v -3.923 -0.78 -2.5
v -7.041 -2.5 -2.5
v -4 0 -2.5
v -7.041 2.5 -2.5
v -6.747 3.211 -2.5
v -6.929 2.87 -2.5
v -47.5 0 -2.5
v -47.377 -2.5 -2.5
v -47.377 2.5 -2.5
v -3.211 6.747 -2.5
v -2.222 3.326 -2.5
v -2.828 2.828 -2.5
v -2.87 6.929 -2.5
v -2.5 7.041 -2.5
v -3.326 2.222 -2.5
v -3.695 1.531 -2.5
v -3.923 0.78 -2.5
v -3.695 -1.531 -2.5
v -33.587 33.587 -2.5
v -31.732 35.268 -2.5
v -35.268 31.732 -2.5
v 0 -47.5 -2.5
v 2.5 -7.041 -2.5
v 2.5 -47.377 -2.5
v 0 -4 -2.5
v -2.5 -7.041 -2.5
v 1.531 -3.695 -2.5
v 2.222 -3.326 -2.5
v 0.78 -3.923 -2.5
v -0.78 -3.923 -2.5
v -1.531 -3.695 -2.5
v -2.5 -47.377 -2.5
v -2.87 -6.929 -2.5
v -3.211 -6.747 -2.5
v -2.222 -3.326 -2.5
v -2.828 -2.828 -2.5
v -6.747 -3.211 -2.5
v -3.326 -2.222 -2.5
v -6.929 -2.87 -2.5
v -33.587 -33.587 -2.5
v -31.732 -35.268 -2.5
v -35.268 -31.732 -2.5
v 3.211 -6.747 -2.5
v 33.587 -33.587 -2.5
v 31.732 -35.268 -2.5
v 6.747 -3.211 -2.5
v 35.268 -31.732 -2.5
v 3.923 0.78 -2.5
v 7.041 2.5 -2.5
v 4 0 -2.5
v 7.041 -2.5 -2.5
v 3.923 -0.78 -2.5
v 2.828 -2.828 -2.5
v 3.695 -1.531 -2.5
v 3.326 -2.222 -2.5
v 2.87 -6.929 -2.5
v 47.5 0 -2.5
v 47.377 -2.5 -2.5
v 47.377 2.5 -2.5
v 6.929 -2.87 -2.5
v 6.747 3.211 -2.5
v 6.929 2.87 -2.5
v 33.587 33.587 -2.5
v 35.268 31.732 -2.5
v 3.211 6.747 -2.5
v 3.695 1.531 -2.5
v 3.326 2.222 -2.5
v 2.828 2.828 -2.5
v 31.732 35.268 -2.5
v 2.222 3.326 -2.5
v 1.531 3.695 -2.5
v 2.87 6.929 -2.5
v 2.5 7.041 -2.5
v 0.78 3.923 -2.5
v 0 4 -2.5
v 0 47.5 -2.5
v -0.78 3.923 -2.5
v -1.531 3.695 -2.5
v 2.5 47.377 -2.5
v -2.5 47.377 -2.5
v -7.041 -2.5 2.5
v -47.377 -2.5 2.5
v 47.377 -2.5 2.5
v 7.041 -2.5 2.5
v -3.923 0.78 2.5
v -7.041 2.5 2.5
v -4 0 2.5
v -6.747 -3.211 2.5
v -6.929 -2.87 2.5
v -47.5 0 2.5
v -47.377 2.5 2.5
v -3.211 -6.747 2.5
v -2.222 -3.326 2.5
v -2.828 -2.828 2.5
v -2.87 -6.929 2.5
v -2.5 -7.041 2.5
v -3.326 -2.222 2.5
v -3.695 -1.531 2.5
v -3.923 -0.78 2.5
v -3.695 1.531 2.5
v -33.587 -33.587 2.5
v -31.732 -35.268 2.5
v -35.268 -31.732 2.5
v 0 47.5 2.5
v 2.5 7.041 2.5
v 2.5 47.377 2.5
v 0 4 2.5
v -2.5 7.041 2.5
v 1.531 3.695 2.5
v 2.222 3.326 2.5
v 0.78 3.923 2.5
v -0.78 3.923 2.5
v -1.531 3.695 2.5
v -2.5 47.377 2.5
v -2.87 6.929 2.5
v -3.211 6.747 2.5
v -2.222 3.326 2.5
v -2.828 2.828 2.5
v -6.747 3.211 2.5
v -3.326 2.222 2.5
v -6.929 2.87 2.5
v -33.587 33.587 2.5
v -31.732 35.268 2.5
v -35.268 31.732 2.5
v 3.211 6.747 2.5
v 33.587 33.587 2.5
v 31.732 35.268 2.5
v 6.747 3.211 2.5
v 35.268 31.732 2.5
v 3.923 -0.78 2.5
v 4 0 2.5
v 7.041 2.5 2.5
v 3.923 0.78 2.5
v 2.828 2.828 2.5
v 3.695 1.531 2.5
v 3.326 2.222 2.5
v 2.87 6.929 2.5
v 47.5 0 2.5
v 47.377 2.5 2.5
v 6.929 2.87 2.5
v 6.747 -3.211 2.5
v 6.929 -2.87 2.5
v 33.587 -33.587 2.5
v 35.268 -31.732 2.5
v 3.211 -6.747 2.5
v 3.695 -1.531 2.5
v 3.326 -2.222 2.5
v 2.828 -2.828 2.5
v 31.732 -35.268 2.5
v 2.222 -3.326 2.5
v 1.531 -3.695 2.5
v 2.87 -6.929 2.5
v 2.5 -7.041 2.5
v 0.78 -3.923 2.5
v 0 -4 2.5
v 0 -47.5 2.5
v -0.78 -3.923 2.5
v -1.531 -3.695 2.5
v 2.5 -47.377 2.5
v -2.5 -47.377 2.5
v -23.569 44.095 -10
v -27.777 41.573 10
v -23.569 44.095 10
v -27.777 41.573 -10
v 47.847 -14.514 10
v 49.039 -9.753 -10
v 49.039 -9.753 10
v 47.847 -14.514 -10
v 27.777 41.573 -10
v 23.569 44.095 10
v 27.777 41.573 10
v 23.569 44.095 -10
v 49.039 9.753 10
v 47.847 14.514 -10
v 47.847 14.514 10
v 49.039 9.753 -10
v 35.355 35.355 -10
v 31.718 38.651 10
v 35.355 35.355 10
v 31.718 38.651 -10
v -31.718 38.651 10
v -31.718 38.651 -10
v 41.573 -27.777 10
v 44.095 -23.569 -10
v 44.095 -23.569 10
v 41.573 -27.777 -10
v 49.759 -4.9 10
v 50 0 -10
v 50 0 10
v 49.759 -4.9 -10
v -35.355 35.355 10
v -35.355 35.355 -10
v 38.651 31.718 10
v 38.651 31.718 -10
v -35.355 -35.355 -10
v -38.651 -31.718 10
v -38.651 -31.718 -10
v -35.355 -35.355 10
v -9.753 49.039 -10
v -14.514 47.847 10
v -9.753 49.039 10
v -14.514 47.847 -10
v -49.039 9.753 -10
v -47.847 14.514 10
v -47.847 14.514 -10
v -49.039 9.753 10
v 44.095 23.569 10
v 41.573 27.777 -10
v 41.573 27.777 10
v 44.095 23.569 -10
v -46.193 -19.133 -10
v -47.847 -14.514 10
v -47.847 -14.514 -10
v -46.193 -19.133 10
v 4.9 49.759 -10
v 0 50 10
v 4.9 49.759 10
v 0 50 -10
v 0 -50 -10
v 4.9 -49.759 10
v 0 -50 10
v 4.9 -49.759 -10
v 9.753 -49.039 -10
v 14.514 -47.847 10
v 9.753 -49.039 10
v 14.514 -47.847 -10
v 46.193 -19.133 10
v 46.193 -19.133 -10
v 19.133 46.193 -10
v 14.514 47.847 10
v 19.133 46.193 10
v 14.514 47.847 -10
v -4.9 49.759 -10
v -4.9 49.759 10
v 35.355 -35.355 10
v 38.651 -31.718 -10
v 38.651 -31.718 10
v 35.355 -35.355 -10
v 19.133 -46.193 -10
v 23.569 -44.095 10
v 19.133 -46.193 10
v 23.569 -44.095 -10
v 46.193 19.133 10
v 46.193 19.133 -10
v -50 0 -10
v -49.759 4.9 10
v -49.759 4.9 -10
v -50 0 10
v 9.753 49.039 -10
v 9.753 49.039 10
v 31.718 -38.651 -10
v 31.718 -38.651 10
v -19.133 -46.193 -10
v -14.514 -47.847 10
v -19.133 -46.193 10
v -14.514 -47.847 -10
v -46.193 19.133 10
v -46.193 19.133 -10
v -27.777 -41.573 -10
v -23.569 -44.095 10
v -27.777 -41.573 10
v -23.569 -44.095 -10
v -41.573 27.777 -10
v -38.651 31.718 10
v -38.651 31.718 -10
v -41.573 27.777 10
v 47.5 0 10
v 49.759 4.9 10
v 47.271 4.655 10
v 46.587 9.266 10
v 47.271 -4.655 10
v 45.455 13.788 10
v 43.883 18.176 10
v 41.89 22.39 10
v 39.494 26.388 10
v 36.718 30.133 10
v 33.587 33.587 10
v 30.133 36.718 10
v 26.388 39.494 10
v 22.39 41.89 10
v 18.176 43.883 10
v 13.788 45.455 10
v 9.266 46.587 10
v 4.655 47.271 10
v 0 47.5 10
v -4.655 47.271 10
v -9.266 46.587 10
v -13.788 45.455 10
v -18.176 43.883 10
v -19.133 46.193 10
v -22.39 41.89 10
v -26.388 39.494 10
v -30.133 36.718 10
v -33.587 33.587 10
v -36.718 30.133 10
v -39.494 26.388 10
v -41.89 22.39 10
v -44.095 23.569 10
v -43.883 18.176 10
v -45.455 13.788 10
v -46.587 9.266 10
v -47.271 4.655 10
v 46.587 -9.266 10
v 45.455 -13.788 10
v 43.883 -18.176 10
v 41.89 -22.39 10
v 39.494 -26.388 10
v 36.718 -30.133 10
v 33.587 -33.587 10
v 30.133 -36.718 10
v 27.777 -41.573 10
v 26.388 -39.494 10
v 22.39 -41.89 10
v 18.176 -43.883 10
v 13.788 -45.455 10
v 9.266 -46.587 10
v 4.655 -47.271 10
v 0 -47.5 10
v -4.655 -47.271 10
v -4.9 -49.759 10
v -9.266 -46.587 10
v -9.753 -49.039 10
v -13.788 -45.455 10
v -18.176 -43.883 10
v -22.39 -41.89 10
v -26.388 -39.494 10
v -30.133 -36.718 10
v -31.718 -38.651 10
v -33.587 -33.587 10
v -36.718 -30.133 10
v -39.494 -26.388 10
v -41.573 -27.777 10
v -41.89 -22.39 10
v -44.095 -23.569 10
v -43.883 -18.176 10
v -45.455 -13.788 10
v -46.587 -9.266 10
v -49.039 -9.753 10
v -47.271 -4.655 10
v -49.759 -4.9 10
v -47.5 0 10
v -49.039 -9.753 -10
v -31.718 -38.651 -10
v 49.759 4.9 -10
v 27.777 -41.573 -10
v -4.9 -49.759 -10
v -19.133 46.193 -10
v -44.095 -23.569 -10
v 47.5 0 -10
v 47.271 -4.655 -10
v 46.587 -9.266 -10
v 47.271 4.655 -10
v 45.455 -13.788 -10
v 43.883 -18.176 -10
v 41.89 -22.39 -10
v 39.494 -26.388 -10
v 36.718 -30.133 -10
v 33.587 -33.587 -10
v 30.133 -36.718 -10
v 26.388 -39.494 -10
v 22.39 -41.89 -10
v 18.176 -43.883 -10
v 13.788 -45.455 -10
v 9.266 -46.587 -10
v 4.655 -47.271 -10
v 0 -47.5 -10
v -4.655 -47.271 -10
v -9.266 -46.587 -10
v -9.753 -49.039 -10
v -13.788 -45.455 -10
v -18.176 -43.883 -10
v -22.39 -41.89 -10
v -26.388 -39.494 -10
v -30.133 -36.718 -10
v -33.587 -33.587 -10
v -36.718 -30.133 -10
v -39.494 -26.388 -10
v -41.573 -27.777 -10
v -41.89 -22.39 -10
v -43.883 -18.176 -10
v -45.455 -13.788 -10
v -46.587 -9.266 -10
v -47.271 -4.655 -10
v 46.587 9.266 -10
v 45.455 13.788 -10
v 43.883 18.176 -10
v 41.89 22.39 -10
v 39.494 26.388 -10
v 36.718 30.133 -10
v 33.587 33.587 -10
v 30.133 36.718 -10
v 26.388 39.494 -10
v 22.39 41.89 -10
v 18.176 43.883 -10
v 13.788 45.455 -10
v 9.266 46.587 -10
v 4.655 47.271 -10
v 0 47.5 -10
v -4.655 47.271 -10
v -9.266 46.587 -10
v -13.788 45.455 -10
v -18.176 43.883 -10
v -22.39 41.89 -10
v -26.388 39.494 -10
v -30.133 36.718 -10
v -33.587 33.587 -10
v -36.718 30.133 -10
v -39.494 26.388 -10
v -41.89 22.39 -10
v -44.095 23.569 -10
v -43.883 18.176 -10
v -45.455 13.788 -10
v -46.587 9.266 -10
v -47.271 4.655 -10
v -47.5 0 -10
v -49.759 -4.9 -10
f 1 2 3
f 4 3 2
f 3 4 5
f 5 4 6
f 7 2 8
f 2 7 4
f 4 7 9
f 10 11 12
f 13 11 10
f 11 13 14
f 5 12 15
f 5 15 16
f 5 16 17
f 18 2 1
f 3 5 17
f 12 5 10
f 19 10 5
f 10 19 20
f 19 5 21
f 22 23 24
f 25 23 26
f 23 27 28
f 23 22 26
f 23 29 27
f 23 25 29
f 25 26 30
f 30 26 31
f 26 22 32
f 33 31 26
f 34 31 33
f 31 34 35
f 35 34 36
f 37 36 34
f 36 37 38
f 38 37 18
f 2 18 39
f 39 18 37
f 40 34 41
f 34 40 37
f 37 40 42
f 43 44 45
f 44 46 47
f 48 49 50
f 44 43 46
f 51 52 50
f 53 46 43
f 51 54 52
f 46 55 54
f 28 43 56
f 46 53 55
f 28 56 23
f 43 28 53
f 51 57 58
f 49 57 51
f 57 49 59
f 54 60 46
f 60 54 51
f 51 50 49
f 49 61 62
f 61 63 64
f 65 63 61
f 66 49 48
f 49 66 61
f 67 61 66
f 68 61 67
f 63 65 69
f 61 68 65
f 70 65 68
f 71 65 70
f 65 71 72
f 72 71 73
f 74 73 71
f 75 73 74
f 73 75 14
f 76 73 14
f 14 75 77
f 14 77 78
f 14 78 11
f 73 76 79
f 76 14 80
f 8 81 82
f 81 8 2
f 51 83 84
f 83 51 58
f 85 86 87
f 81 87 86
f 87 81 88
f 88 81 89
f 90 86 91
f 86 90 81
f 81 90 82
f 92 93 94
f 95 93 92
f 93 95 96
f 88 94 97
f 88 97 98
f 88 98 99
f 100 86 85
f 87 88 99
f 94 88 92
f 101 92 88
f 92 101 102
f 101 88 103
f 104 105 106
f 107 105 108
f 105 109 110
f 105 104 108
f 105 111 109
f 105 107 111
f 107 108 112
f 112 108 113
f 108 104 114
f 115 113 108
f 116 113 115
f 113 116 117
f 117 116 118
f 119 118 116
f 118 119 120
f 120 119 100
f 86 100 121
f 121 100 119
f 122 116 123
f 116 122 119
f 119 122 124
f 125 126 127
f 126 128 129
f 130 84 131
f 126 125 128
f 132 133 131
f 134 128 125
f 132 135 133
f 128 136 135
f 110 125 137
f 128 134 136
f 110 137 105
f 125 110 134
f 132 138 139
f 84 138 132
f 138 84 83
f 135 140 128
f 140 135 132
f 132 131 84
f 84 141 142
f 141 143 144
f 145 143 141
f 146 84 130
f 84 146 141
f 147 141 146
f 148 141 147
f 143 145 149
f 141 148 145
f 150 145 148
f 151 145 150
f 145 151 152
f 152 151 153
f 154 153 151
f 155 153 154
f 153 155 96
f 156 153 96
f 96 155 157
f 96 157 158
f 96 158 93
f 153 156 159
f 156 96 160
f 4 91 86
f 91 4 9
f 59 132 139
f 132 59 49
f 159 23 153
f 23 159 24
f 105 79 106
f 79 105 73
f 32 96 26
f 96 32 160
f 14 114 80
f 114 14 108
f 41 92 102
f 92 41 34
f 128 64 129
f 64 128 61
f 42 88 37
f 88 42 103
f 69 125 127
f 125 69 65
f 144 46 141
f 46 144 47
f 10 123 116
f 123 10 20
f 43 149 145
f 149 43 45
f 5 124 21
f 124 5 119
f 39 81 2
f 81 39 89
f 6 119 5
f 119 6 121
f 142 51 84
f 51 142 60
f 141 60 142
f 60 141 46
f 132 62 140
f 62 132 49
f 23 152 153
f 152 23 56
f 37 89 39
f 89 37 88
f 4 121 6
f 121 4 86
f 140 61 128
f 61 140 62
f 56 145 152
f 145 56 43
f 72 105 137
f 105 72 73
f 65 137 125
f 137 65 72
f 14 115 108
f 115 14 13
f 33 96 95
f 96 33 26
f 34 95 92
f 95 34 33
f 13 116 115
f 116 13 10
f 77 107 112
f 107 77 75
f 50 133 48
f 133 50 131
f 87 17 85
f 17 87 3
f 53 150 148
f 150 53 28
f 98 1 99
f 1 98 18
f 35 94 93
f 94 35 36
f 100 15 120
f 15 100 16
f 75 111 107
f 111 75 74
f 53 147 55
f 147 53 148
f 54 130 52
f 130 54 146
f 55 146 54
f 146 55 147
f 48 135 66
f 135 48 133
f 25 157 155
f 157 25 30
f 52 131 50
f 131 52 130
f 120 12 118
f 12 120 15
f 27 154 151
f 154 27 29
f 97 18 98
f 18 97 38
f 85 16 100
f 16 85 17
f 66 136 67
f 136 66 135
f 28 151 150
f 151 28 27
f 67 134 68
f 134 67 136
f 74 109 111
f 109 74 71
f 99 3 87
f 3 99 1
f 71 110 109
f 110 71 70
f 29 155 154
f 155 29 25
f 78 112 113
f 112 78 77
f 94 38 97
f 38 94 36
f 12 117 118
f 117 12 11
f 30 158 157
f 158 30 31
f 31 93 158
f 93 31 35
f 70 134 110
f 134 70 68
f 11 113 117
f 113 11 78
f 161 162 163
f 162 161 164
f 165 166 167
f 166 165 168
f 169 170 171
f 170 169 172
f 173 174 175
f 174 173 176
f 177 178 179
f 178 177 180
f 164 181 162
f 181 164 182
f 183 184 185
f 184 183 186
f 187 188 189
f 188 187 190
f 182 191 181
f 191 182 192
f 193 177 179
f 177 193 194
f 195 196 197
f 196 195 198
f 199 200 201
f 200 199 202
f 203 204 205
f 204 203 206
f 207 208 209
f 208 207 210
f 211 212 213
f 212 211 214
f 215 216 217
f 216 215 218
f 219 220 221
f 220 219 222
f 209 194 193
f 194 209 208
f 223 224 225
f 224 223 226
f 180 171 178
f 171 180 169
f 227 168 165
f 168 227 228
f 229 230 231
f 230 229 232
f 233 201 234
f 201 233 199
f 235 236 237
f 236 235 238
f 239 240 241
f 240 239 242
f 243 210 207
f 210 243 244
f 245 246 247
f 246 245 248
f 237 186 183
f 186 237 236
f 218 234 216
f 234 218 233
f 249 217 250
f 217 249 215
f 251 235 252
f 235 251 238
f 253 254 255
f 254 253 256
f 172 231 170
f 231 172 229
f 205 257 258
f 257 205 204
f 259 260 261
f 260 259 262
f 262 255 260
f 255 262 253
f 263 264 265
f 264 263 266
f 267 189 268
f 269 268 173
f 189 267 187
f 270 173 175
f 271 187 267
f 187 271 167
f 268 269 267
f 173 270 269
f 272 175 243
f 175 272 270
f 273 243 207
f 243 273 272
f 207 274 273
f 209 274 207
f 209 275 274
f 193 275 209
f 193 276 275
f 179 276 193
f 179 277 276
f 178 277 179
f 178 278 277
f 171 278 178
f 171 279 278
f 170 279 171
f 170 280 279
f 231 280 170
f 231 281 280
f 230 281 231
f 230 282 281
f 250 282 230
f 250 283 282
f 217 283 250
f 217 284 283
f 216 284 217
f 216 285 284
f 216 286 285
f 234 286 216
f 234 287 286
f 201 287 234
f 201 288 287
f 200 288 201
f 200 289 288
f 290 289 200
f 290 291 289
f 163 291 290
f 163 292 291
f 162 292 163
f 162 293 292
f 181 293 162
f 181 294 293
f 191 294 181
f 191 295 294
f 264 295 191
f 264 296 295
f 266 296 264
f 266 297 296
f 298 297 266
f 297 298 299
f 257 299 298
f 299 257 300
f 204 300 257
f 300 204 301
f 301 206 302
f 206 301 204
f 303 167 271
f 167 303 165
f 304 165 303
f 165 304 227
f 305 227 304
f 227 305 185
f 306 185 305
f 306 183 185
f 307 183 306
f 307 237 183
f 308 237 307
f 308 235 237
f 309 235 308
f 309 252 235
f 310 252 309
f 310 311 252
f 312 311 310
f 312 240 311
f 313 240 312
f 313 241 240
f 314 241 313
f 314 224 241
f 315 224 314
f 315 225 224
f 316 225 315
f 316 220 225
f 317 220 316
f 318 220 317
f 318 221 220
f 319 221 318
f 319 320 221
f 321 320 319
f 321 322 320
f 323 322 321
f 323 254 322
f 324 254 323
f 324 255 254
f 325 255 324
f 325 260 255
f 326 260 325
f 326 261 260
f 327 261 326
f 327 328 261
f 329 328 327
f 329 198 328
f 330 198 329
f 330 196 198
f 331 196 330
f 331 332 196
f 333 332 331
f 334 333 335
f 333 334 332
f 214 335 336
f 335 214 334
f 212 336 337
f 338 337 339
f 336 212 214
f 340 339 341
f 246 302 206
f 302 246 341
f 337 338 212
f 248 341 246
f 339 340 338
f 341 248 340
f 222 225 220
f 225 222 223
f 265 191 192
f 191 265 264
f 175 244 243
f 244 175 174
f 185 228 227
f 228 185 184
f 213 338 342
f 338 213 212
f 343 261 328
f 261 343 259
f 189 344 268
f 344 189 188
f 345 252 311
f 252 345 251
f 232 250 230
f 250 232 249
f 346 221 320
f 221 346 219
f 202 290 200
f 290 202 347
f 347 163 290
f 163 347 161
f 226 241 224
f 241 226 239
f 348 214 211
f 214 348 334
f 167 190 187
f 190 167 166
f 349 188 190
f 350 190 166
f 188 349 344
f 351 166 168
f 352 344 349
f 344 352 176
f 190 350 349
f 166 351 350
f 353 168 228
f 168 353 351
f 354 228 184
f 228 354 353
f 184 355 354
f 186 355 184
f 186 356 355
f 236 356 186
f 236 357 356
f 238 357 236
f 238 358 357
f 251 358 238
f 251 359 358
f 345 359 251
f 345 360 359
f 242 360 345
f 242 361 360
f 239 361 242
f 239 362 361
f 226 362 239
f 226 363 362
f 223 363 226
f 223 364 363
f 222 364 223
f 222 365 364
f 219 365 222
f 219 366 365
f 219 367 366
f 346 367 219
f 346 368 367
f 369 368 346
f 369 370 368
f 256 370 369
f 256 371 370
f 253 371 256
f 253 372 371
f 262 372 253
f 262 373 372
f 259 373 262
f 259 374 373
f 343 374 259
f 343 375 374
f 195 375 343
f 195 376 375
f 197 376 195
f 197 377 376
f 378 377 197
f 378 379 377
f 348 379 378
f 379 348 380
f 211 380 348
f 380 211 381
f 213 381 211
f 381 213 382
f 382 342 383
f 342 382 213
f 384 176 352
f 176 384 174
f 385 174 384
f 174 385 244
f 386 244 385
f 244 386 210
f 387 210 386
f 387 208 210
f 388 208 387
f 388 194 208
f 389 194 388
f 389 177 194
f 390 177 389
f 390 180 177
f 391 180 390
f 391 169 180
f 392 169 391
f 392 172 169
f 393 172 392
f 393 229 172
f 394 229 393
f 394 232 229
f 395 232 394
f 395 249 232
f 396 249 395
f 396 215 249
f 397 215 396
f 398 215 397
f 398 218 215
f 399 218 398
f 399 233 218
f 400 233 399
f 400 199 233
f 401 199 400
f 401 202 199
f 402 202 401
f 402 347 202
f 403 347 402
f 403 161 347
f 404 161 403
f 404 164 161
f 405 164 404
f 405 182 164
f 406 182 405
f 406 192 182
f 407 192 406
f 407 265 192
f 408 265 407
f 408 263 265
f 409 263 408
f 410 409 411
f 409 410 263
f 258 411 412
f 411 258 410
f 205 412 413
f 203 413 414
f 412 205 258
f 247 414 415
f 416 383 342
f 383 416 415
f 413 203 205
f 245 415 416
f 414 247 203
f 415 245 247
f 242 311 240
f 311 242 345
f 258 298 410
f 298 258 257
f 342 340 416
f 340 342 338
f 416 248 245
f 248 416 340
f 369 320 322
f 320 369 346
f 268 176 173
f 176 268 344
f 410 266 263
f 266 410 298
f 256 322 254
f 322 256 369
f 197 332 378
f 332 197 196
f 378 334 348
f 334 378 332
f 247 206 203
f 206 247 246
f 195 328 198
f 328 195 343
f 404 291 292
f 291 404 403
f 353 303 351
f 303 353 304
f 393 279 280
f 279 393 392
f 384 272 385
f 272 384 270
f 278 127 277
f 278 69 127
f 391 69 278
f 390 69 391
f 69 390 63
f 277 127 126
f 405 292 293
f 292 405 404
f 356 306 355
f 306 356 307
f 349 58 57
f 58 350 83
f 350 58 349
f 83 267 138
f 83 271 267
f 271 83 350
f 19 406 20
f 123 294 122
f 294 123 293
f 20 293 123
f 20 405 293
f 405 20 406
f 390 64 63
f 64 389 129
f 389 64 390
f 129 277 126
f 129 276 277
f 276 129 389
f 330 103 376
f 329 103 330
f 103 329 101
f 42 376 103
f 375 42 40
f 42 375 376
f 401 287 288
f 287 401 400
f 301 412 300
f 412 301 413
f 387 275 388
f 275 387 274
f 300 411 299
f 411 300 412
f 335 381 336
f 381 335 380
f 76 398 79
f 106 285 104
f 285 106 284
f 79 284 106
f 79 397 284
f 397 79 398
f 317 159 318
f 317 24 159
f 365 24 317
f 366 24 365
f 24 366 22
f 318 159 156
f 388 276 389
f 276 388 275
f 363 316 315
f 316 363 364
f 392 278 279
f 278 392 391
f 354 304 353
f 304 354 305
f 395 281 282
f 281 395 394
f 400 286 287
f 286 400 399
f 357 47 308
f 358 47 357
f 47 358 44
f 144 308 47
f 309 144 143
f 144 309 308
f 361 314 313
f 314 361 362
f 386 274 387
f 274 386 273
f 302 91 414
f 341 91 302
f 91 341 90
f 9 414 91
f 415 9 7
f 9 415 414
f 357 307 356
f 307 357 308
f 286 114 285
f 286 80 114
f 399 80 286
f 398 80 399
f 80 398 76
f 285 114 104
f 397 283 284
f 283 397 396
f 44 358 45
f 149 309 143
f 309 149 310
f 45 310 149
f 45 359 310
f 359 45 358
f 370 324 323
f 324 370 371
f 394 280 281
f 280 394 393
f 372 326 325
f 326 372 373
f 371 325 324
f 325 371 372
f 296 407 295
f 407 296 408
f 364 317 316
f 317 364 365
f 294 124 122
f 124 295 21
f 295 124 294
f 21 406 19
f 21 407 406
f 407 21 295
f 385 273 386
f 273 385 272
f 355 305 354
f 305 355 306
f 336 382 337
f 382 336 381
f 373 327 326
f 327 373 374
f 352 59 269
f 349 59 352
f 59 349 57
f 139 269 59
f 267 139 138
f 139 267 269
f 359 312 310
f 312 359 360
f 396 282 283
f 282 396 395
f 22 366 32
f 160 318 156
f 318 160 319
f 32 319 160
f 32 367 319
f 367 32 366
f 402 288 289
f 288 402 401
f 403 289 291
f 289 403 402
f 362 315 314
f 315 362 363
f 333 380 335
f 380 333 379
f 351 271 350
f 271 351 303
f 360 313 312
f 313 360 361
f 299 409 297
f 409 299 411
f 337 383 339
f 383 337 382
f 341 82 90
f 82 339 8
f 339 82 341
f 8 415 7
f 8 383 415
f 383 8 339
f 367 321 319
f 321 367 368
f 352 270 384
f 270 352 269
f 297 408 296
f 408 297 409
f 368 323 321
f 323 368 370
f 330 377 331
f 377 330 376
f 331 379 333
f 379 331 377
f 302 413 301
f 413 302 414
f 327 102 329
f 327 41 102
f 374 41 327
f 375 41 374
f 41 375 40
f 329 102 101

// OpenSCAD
union()
{
    difference()
    {
        union()
        {
            union()
            {
                union()
                {
                    linear_extrude(height = 5.0, twist = 0.0, scale = 1.0, slices = 1, center = true)
                    {
                        scale([99.0, 5.0])
                        {
                            M52();
                        }
                    }
                    rotate([0.0, 0.0, 90.0])
                    {
                        linear_extrude(height = 5.0, twist = 0.0, scale = 1.0, slices = 1, center = true)
                        {
                            scale([99.0, 5.0])
                            {
                                M52();
                            }
                        }
                    }
                }
                rotate([0.0, 0.0, 45.0])
                {
                    union()
                    {
                        linear_extrude(height = 5.0, twist = 0.0, scale = 1.0, slices = 1, center = true)
                        {
                            scale([99.0, 5.0])
                            {
                                M52();
                            }
                        }
                        rotate([0.0, 0.0, 90.0])
                        {
                            linear_extrude(height = 5.0, twist = 0.0, scale = 1.0, slices = 1, center = true)
                            {
                                scale([99.0, 5.0])
                                {
                                    M52();
                                }
                            }
                        }
                    }
                }
            }
            difference()
            {
                linear_extrude(height = 5.0, twist = 0.0, scale = 1.0, slices = 1, center = true)
                {
                    scale([15.0, 15.0])
                    {
                        M51();
                    }
                }
                linear_extrude(height = 6.0, twist = 0.0, scale = 1.0, slices = 1, center = true)
                {
                    scale([8.0, 8.0])
                    {
                        M51();
                    }
                }
            }
        }
        linear_extrude(height = 6.0, twist = 0.0, scale = 1.0, slices = 1, center = true)
        {
            scale([8.0, 8.0])
            {
                M51();
            }
        }
    }
    difference()
    {
        linear_extrude(height = 20.0, twist = 0.0, scale = 1.0, slices = 1, center = true)
        {
            scale([100.0, 100.0])
            {
                M107();
            }
        }
        linear_extrude(height = 21.0, twist = 0.0, scale = 1.0, slices = 1, center = true)
        {
            scale([95.0, 95.0])
            {
                M107();
            }
        }
    }
}

module M51()
{
    polygon
    (
        points =
        [
            [0.5, 0.0], 
            [0.4903926402016152, 0.09754516100806412], 
            [0.46193976625564337, 0.1913417161825449], 
            [0.4157348061512726, 0.2777851165098011], 
            [0.3535533905932738, 0.35355339059327373], 
            [0.27778511650980114, 0.4157348061512726], 
            [0.19134171618254492, 0.46193976625564337], 
            [0.09754516100806417, 0.4903926402016152], 
            [3.061616997868383E-17, 0.5], 
            [-0.0975451610080641, 0.4903926402016152], 
            [-0.19134171618254486, 0.46193976625564337], 
            [-0.277785116509801, 0.41573480615127273], 
            [-0.35355339059327373, 0.3535533905932738], 
            [-0.4157348061512727, 0.2777851165098011], 
            [-0.46193976625564337, 0.19134171618254495], 
            [-0.4903926402016152, 0.0975451610080643], 
            [-0.5, 6.123233995736766E-17], 
            [-0.4903926402016152, -0.09754516100806418], 
            [-0.4619397662556434, -0.19134171618254484], 
            [-0.41573480615127273, -0.277785116509801], 
            [-0.35355339059327384, -0.35355339059327373], 
            [-0.2777851165098011, -0.4157348061512726], 
            [-0.19134171618254517, -0.46193976625564326], 
            [-0.09754516100806433, -0.49039264020161516], 
            [-9.184850993605148E-17, -0.5], 
            [0.09754516100806415, -0.4903926402016152], 
            [0.191341716182545, -0.4619397662556433], 
            [0.2777851165098009, -0.41573480615127273], 
            [0.3535533905932737, -0.35355339059327384], 
            [0.4157348061512726, -0.2777851165098011], 
            [0.46193976625564326, -0.1913417161825452], 
            [0.49039264020161516, -0.09754516100806436]
        ],
        paths =
        [
            [0, 1, 2, 3, 4, 5, 6, 7, 8, 9, 10, 11, 12, 13, 14, 15, 16, 17, 18, 19, 20, 21, 22, 23, 24, 25, 26, 27, 28, 29, 30, 31]
        ]
    );
}

module M52()
{
    polygon
    (
        points =
        [
            [-0.5, -0.5], 
            [0.5, -0.5], 
            [0.5, 0.5], 
            [-0.5, 0.5]
        ],
        paths =
        [
            [0, 1, 2, 3]
        ]
    );
}

module M107()
{
    polygon
    (
        points =
        [
            [0.5, 0.0], 
            [0.49759236333609846, 0.0490085701647803], 
            [0.4903926402016152, 0.09754516100806412], 
            [0.4784701678661044, 0.14514233862723117], 
            [0.46193976625564337, 0.1913417161825449], 
            [0.4409606321741775, 0.23569836841299882], 
            [0.4157348061512726, 0.2777851165098011], 
            [0.3865052266813685, 0.31719664208182274], 
            [0.3535533905932738, 0.35355339059327373], 
            [0.31719664208182274, 0.3865052266813685], 
            [0.27778511650980114, 0.4157348061512726], 
            [0.2356983684129989, 0.44096063217417747], 
            [0.19134171618254492, 0.46193976625564337], 
            [0.14514233862723117, 0.47847016786610447], 
            [0.09754516100806417, 0.4903926402016152], 
            [0.049008570164780385, 0.4975923633360984], 
            [3.061616997868383E-17, 0.5], 
            [-0.04900857016478032, 0.49759236333609846], 
            [-0.0975451610080641, 0.4903926402016152], 
            [-0.14514233862723108, 0.47847016786610447], 
            [-0.19134171618254486, 0.46193976625564337], 
            [-0.23569836841299885, 0.4409606321741775], 
            [-0.277785116509801, 0.41573480615127273], 
            [-0.3171966420818227, 0.38650522668136855], 
            [-0.35355339059327373, 0.3535533905932738], 
            [-0.3865052266813685, 0.31719664208182274], 
            [-0.4157348061512727, 0.2777851165098011], 
            [-0.44096063217417747, 0.23569836841299893], 
            [-0.46193976625564337, 0.19134171618254495], 
            [-0.4784701678661044, 0.1451423386272312], 
            [-0.4903926402016152, 0.0975451610080643], 
            [-0.4975923633360984, 0.04900857016478041], 
            [-0.5, 6.123233995736766E-17], 
            [-0.49759236333609846, -0.049008570164780295], 
            [-0.4903926402016152, -0.09754516100806418], 
            [-0.47847016786610447, -0.14514233862723105], 
            [-0.4619397662556434, -0.19134171618254484], 
            [-0.4409606321741775, -0.23569836841299882], 
            [-0.41573480615127273, -0.277785116509801], 
            [-0.38650522668136855, -0.31719664208182263], 
            [-0.35355339059327384, -0.35355339059327373], 
            [-0.31719664208182297, -0.38650522668136833], 
            [-0.2777851165098011, -0.4157348061512726], 
            [-0.23569836841299893, -0.44096063217417747], 
            [-0.19134171618254517, -0.46193976625564326], 
            [-0.14514233862723122, -0.4784701678661044], 
            [-0.09754516100806433, -0.49039264020161516], 
            [-0.049008570164780225, -0.49759236333609846], 
            [-9.184850993605148E-17, -0.5], 
            [0.049008570164780045, -0.49759236333609846], 
            [0.09754516100806415, -0.4903926402016152], 
            [0.14514233862723103, -0.47847016786610447], 
            [0.191341716182545, -0.4619397662556433], 
            [0.2356983684129988, -0.4409606321741775], 
            [0.2777851165098009, -0.41573480615127273], 
            [0.3171966420818228, -0.38650522668136844], 
            [0.3535533905932737, -0.35355339059327384], 
            [0.38650522668136833, -0.31719664208182297], 
            [0.4157348061512726, -0.2777851165098011], 
            [0.4409606321741774, -0.23569836841299896], 
            [0.46193976625564326, -0.1913417161825452], 
            [0.4784701678661044, -0.14514233862723125], 
            [0.49039264020161516, -0.09754516100806436], 
            [0.49759236333609846, -0.04900857016478025]
        ],
        paths =
        [
            [0, 1, 2, 3, 4, 5, 6, 7, 8, 9, 10, 11, 12, 13, 14, 15, 16, 17, 18, 19, 20, 21, 22, 23, 24, 25, 26, 27, 28, 29, 30, 31, 32, 33, 34, 35, 36, 37, 38, 39, 40, 41, 42, 43, 44, 45, 46, 47, 48, 49, 50, 51, 52, 53, 54, 55, 56, 57, 58, 59, 60, 61, 62, 63]
        ]
    );
}
